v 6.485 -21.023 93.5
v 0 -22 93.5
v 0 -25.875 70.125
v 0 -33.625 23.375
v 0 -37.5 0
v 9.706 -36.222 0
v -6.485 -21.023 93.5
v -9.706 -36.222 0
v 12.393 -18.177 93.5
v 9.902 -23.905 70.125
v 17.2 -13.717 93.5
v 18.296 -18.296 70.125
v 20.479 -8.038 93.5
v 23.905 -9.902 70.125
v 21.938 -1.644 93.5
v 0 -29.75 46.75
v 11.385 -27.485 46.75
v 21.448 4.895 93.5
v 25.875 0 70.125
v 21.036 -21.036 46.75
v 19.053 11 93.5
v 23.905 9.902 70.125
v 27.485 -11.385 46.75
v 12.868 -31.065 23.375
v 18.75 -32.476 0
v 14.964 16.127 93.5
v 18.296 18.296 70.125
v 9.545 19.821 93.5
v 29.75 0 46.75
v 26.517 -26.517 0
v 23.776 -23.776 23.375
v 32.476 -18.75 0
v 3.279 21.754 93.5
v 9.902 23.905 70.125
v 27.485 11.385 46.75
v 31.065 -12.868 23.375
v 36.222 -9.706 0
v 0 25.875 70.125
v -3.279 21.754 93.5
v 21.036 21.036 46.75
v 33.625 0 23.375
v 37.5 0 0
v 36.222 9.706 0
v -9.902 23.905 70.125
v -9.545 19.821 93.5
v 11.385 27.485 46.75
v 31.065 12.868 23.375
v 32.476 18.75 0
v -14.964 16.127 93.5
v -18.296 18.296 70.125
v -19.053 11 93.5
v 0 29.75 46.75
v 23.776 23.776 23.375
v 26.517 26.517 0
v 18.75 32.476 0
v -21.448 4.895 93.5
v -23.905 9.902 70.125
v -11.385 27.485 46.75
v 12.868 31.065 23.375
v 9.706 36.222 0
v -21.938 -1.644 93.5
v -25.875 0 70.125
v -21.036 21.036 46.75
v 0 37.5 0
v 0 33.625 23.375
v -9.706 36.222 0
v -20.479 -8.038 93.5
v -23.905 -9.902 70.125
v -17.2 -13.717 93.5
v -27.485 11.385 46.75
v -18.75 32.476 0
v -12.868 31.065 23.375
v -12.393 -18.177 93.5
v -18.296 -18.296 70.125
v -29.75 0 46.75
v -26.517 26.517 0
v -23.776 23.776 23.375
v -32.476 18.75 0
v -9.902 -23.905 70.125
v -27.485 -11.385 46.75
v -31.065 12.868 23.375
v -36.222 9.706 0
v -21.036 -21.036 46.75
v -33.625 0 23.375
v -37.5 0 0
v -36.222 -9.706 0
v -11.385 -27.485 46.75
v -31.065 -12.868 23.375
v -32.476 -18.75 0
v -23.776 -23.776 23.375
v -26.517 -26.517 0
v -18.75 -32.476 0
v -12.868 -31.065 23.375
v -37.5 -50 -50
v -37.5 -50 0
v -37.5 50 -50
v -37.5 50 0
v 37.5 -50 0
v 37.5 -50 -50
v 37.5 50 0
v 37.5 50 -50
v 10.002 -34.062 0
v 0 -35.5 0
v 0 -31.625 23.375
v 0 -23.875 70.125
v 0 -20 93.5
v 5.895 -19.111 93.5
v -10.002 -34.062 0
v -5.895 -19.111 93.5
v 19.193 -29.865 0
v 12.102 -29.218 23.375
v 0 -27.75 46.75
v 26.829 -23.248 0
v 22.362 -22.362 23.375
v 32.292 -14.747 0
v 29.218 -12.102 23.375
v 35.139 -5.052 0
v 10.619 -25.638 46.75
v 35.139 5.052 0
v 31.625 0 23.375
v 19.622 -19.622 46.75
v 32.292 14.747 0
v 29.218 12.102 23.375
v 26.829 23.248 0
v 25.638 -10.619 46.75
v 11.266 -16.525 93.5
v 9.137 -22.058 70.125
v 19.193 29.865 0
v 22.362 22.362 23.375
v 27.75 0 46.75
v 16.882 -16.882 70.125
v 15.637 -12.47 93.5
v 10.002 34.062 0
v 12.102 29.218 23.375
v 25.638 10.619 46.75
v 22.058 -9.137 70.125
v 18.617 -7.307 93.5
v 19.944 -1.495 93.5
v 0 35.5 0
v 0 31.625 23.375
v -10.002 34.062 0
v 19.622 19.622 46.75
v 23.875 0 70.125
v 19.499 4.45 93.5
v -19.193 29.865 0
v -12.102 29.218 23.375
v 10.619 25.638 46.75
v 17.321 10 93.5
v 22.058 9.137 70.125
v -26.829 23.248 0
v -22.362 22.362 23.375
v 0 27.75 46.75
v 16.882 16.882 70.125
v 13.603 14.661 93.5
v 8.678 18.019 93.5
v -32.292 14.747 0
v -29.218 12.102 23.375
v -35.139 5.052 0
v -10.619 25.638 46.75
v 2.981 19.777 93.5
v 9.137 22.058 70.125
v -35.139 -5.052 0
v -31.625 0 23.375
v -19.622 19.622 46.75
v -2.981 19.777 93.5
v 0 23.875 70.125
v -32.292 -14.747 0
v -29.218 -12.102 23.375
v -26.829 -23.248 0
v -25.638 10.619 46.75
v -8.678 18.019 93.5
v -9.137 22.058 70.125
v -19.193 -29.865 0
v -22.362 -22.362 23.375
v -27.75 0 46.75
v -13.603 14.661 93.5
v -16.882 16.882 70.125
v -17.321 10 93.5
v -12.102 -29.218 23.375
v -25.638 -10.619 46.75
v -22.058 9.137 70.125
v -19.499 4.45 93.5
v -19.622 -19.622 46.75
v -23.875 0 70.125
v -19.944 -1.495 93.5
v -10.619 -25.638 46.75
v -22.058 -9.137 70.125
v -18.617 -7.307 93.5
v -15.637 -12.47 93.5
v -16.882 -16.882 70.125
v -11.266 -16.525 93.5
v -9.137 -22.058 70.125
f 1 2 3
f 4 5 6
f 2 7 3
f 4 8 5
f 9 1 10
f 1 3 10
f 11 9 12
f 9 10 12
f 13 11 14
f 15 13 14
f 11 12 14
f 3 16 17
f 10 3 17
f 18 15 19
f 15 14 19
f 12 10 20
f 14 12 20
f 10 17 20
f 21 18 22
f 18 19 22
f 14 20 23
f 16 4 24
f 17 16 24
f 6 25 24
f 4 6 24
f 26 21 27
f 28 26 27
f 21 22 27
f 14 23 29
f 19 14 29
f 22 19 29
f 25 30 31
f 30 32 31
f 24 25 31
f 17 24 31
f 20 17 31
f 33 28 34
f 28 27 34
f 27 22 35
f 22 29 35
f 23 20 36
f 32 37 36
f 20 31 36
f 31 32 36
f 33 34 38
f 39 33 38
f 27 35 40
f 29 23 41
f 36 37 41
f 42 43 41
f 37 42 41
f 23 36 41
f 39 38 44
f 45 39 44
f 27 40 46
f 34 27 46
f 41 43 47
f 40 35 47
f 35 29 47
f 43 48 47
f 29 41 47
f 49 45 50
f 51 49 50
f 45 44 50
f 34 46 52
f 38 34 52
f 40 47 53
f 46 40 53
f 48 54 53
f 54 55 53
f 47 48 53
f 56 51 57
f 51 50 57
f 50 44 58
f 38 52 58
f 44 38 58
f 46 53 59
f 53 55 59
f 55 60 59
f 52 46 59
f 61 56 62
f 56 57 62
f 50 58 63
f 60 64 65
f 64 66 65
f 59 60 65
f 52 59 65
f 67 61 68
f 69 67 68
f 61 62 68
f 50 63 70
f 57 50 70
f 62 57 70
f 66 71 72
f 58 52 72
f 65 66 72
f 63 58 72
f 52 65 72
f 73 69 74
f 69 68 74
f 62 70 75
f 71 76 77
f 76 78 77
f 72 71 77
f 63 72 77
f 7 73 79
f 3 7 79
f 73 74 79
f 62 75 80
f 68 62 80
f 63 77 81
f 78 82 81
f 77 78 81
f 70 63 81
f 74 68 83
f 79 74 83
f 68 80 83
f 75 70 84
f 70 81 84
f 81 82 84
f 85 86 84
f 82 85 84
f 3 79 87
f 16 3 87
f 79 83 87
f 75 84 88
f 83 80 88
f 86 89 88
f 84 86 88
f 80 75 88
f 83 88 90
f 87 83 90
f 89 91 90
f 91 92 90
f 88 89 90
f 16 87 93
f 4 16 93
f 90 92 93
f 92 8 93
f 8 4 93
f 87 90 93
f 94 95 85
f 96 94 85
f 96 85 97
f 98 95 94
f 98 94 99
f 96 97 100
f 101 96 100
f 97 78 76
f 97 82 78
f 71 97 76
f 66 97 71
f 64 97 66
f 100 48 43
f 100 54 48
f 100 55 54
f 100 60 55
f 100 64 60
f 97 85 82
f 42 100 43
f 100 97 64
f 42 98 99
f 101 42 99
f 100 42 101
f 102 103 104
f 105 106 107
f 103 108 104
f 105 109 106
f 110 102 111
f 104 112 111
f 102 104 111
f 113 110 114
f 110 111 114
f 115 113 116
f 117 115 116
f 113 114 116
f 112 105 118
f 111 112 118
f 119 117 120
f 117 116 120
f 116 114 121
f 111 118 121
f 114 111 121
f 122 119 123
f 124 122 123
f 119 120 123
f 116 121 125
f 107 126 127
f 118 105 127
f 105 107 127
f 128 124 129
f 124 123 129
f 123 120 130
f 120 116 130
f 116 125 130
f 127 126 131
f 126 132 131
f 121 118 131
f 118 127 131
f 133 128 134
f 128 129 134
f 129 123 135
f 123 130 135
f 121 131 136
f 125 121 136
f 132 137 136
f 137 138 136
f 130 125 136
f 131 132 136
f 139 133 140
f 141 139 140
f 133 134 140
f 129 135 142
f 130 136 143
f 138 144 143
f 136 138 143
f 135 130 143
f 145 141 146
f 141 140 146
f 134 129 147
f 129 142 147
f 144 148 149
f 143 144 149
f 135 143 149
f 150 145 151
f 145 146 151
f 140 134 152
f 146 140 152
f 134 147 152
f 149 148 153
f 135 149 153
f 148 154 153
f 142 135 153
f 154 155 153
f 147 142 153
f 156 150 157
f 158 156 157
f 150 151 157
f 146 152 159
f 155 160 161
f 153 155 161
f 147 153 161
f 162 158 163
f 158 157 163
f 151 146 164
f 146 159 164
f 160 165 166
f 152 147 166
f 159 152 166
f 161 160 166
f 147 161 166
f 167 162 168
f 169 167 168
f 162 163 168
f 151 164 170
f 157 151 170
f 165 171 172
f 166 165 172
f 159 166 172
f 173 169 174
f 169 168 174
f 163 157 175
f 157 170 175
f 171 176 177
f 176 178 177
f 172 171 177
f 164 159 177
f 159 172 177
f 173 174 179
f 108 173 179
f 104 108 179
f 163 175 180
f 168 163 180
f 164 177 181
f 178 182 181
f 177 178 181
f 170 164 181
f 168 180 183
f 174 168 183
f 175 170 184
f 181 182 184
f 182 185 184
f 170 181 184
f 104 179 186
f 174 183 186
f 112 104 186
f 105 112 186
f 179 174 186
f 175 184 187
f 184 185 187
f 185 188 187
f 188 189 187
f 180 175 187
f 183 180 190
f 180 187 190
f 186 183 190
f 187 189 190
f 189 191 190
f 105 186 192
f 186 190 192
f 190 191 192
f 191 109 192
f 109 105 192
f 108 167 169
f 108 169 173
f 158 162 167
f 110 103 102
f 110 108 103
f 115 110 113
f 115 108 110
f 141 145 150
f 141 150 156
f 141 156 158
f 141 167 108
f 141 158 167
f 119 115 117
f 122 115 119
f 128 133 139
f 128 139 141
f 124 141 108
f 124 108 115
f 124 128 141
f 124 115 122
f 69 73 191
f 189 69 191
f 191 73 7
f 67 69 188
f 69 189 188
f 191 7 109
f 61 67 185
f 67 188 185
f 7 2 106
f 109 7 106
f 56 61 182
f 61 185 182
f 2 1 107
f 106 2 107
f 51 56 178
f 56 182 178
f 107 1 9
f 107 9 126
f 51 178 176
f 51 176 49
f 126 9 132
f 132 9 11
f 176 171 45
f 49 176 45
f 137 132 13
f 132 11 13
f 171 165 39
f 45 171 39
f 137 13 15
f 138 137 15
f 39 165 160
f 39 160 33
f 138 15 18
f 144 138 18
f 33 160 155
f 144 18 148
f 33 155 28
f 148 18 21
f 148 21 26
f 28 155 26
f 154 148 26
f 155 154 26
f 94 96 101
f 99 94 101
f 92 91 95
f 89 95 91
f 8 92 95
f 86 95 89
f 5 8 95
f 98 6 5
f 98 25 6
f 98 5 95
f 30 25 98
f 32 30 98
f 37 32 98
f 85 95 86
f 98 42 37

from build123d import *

# Parameters (mm, degrees)
F0_W     = 75
F0_H     = 100
F1_DEPTH = 50


with BuildPart() as f1:
    # F0 (on Top) → F1 (new body)
    with BuildSketch(Plane.XY):
        Rectangle(F0_W, F0_H)
    extrude(amount=-F1_DEPTH)

    # F2 (on Right) → F3 (revolve)
    with BuildSketch(Plane.YZ):
        Polygon((-35.5, 0), (-20, 93.500273), (-22, 93.500273), (-37.5, 0), align=None)
    revolve(axis=Axis((0, 0, 46.750137), (0, 0, 1)))


solid = f1.part
